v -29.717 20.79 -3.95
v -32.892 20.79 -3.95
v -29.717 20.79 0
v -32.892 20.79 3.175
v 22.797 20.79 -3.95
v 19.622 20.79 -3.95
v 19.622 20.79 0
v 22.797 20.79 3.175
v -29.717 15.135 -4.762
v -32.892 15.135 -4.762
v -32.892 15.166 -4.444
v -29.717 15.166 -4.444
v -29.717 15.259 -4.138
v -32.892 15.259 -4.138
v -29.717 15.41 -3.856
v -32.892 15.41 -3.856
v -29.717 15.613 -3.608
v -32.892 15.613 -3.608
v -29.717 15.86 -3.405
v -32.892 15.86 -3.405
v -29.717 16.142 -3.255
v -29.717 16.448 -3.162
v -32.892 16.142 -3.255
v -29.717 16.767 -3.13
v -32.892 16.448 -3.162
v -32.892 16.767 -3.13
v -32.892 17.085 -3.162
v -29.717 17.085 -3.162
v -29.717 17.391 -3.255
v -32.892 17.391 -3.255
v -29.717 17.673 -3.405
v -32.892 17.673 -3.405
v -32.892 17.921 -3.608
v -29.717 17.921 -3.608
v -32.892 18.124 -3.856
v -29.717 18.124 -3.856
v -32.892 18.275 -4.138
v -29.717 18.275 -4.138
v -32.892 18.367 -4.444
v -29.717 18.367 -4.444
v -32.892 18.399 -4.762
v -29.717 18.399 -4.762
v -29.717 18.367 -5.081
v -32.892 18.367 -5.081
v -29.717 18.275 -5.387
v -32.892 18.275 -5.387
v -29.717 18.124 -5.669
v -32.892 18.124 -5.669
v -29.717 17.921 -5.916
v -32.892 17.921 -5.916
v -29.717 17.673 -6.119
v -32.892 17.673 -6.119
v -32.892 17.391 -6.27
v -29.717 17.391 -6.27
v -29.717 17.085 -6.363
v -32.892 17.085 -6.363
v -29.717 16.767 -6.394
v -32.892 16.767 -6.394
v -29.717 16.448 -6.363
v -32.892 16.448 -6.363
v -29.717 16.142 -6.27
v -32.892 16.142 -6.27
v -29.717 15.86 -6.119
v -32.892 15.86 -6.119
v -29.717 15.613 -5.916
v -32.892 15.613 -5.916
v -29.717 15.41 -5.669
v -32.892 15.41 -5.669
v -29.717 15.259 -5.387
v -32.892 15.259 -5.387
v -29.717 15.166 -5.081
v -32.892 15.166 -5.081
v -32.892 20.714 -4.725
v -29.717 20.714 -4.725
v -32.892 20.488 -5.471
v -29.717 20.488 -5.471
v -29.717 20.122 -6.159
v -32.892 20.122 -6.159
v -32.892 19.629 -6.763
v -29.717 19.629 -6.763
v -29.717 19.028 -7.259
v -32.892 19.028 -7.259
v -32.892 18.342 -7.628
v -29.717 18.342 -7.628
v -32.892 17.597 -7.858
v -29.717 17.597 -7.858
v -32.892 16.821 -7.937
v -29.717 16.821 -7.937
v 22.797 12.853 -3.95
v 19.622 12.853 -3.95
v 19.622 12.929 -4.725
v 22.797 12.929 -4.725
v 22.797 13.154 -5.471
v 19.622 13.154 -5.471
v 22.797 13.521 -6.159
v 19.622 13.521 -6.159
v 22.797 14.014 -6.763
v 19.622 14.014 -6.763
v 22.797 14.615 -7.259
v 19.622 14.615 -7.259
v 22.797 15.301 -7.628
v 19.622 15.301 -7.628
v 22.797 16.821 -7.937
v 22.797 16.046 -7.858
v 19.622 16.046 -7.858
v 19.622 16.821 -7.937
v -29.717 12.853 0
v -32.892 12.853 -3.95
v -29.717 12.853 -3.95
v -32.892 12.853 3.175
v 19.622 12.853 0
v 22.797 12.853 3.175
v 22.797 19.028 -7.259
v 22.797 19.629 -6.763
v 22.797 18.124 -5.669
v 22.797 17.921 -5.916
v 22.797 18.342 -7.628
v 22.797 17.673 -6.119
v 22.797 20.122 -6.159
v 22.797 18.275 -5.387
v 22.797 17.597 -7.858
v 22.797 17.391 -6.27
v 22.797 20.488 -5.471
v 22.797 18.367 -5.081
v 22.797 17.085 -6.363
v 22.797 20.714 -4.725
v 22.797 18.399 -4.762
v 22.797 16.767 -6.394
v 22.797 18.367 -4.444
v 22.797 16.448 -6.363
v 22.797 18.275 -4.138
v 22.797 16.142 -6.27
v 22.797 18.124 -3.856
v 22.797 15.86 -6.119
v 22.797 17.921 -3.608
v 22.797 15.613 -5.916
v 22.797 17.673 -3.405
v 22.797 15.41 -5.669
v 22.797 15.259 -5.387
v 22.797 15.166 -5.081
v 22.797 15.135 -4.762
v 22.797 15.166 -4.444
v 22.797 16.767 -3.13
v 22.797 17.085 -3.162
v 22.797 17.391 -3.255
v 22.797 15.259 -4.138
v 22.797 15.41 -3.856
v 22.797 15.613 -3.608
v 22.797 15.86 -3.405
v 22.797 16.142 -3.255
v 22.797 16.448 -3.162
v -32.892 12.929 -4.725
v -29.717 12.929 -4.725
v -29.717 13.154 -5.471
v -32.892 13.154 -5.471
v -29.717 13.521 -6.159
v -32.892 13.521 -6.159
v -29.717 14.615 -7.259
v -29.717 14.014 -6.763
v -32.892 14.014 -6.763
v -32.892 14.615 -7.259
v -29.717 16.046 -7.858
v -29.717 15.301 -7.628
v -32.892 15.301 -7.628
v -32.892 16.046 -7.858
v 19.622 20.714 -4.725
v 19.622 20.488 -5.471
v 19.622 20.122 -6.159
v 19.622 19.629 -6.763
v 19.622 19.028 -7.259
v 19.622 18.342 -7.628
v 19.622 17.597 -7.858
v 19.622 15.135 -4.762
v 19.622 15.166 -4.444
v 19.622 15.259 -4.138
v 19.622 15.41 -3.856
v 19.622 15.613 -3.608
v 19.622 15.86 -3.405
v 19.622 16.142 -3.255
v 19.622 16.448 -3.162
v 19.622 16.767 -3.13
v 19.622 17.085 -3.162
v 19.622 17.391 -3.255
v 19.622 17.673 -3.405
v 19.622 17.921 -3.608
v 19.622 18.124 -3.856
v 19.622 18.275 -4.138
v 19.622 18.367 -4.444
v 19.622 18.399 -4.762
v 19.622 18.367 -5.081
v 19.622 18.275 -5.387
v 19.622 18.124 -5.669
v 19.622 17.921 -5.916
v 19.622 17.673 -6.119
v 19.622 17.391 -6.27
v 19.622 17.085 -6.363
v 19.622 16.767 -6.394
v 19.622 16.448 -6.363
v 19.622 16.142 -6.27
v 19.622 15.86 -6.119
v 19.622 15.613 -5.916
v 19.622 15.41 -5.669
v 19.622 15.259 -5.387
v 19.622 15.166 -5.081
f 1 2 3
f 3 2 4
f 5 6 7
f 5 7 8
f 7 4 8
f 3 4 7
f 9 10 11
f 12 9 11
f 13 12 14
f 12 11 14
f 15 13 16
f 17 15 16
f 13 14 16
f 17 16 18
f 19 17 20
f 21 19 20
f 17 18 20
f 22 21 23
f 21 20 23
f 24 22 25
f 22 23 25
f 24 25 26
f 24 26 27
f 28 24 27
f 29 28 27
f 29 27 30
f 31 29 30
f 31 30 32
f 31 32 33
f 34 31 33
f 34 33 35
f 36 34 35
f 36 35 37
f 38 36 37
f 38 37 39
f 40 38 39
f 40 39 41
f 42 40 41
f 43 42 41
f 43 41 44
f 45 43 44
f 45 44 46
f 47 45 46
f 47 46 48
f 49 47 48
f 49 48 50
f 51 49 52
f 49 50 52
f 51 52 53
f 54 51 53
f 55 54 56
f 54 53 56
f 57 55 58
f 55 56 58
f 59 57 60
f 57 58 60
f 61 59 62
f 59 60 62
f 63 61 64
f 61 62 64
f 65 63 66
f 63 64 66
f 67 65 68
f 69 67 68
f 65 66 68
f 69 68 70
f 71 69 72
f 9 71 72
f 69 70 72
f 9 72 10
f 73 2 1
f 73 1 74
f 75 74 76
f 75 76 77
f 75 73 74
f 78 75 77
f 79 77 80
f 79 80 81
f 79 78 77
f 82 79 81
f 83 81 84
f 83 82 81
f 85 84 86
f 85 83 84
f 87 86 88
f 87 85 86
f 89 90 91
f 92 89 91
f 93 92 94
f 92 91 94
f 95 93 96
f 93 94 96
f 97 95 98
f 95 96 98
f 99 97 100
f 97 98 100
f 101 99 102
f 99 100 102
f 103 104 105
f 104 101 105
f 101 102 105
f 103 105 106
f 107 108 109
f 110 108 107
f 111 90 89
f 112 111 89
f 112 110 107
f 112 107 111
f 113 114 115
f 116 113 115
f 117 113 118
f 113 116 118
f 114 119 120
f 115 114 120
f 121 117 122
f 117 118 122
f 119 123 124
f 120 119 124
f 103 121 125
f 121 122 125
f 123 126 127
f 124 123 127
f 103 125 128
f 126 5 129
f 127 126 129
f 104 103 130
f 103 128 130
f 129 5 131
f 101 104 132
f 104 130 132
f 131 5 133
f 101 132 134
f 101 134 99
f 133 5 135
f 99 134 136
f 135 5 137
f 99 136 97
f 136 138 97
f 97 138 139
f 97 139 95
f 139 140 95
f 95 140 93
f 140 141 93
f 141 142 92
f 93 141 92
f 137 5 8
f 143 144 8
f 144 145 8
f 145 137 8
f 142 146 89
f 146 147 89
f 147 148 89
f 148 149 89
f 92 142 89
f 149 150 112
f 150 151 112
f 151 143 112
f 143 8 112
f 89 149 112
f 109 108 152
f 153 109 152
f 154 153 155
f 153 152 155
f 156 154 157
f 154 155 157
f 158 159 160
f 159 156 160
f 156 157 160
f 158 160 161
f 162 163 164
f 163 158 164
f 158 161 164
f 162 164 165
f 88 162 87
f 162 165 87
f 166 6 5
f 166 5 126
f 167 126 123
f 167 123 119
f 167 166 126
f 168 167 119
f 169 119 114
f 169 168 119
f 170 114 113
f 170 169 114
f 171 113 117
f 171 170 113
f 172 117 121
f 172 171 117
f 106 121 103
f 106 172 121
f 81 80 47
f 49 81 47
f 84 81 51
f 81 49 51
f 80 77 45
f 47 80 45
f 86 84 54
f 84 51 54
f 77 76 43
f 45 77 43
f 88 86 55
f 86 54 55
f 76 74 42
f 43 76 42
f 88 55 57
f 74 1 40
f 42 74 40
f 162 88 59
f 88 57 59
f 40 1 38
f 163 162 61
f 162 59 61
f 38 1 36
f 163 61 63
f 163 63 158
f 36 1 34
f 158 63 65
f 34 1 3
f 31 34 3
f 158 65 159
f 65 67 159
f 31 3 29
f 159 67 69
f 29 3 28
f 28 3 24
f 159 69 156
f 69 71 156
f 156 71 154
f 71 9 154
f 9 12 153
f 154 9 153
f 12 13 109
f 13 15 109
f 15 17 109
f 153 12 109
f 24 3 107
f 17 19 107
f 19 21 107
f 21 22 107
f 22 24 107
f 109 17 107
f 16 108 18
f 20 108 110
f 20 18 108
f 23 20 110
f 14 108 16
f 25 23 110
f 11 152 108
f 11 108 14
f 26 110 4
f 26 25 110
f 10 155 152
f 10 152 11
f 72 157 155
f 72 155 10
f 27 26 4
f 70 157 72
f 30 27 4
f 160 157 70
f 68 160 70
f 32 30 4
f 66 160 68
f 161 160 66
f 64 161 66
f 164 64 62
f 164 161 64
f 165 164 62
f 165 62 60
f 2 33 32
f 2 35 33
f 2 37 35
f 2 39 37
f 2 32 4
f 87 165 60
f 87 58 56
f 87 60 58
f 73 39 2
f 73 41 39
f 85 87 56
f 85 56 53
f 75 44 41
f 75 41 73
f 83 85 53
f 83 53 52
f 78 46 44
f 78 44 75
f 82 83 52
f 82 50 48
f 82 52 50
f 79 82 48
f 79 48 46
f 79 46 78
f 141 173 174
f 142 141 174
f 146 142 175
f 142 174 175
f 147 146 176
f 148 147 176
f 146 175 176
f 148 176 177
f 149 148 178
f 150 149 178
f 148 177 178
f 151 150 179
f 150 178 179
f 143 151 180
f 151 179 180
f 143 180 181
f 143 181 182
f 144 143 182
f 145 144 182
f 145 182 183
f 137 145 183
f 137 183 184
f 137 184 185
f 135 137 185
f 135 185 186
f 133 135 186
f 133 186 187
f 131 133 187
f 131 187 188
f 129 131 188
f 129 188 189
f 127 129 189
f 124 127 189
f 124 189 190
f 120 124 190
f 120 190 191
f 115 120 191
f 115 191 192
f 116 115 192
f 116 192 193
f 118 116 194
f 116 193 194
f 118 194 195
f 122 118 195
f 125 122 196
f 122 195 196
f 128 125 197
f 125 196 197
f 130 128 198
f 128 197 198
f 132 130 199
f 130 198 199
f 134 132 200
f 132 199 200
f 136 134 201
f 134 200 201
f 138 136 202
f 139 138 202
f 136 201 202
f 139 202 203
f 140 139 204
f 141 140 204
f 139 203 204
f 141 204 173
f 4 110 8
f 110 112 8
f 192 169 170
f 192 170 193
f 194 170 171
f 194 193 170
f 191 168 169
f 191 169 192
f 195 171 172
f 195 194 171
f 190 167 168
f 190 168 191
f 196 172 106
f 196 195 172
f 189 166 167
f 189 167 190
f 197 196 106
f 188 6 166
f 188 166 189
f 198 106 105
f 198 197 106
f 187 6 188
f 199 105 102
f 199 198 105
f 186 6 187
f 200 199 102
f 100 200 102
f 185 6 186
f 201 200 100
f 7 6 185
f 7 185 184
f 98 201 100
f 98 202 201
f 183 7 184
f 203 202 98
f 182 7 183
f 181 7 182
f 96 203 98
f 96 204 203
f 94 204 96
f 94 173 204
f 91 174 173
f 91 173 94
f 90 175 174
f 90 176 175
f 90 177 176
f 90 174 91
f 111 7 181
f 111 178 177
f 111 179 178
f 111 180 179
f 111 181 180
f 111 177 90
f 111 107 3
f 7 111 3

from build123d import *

# Parameters (mm, degrees)
F0_W        = 49.2125
F0_H        = 7.9375
F1_DEPTH    = 3.175
F2_DEPTH    = 3.302
F3_DEPTH    = 3.175
F4_W        = 3.175
F4_H        = 7.9375
F5_DEPTH    = 7.9375
F7_D        = 3.2639
F8_T1_DEPTH = 23.114
F8_T3_DEPTH = 23.114


# Not quite as in the source:
# - a fillet or chamfer that OpenCascade refuses, or shapes differently, is made with other operations: its cross-section is extruded or revolved along the edge and cut away or added


with BuildPart() as f1:
    # F0 (on Top) → F1 (new body)
    with BuildSketch(Plane.XY):
        with Locations((-5.1108673215, 16.8213252627)):
            Rectangle(F0_W, F0_H)
    extrude(amount=F1_DEPTH)

    # F2 (add): a face of the model
    f2_faces = [f1.faces().sort_by_distance(p)[0] for p in [
        (19.4953826785, 16.8213252627, 1.5875),
    ]]
    extrude(f2_faces, amount=F2_DEPTH)

    # F3 (add): a face of the model
    f3_faces = [f1.faces().sort_by_distance(p)[0] for p in [
        (-29.7171173215, 16.8213252627, 1.5875),
    ]]
    extrude(f3_faces, amount=F3_DEPTH)

    # F4 (on face) → F5 (join)
    with BuildSketch(Plane(origin=(0, 0, 0), x_dir=(1, 0, 0), z_dir=(0, 0, -1))):
        with Locations((21.2098826785, -16.8213252627)):
            Rectangle(F4_W, F4_H)
        with Locations((-31.3046173215, -16.8213252627)):
            Rectangle(F4_W, F4_H)
    extrude(amount=F5_DEPTH)

    # F7 (through all)
    with Locations(Plane.YZ.offset(22.7973826785)):
        with Locations((16.7667926535, -4.7623126715)):
            Hole(F7_D / 2)

    # F8: fillet of radius 3.9878 on 4 edges, made by hand

    # F8_s2 → F8_t1 (cut)
    with BuildSketch(Plane.YZ.offset(9.6528826785)):
        with BuildLine():
            ThreePointArc((12.8525752627, -3.9497), (14.0205748406, -6.769500422), (16.8403752627, -7.9375))
            Line((16.8403752627, -7.9375), (12.8525752627, -7.9375))
            Line((12.8525752627, -7.9375), (12.8525752627, -3.9497))
        make_face()
        with BuildLine():
            ThreePointArc((20.7900752627, -3.9497), (19.6220756847, -6.769500422), (16.8022752627, -7.9375))
            Line((16.8022752627, -7.9375), (20.7900752627, -7.9375))
            Line((20.7900752627, -7.9375), (20.7900752627, -3.9497))
        make_face()
    extrude(amount=F8_T1_DEPTH, mode=Mode.SUBTRACT)

    # F8_s4 → F8_t3 (cut)
    with BuildSketch(Plane.YZ.offset(-42.8616173215)):
        with BuildLine():
            ThreePointArc((12.8525752627, -3.9497), (14.0205748406, -6.769500422), (16.8403752627, -7.9375))
            Line((16.8403752627, -7.9375), (12.8525752627, -7.9375))
            Line((12.8525752627, -7.9375), (12.8525752627, -3.9497))
        make_face()
        with BuildLine():
            ThreePointArc((20.7900752627, -3.9497), (19.6220756847, -6.769500422), (16.8022752627, -7.9375))
            Line((16.8022752627, -7.9375), (20.7900752627, -7.9375))
            Line((20.7900752627, -7.9375), (20.7900752627, -3.9497))
        make_face()
    extrude(amount=F8_T3_DEPTH, mode=Mode.SUBTRACT)


solid = f1.part
